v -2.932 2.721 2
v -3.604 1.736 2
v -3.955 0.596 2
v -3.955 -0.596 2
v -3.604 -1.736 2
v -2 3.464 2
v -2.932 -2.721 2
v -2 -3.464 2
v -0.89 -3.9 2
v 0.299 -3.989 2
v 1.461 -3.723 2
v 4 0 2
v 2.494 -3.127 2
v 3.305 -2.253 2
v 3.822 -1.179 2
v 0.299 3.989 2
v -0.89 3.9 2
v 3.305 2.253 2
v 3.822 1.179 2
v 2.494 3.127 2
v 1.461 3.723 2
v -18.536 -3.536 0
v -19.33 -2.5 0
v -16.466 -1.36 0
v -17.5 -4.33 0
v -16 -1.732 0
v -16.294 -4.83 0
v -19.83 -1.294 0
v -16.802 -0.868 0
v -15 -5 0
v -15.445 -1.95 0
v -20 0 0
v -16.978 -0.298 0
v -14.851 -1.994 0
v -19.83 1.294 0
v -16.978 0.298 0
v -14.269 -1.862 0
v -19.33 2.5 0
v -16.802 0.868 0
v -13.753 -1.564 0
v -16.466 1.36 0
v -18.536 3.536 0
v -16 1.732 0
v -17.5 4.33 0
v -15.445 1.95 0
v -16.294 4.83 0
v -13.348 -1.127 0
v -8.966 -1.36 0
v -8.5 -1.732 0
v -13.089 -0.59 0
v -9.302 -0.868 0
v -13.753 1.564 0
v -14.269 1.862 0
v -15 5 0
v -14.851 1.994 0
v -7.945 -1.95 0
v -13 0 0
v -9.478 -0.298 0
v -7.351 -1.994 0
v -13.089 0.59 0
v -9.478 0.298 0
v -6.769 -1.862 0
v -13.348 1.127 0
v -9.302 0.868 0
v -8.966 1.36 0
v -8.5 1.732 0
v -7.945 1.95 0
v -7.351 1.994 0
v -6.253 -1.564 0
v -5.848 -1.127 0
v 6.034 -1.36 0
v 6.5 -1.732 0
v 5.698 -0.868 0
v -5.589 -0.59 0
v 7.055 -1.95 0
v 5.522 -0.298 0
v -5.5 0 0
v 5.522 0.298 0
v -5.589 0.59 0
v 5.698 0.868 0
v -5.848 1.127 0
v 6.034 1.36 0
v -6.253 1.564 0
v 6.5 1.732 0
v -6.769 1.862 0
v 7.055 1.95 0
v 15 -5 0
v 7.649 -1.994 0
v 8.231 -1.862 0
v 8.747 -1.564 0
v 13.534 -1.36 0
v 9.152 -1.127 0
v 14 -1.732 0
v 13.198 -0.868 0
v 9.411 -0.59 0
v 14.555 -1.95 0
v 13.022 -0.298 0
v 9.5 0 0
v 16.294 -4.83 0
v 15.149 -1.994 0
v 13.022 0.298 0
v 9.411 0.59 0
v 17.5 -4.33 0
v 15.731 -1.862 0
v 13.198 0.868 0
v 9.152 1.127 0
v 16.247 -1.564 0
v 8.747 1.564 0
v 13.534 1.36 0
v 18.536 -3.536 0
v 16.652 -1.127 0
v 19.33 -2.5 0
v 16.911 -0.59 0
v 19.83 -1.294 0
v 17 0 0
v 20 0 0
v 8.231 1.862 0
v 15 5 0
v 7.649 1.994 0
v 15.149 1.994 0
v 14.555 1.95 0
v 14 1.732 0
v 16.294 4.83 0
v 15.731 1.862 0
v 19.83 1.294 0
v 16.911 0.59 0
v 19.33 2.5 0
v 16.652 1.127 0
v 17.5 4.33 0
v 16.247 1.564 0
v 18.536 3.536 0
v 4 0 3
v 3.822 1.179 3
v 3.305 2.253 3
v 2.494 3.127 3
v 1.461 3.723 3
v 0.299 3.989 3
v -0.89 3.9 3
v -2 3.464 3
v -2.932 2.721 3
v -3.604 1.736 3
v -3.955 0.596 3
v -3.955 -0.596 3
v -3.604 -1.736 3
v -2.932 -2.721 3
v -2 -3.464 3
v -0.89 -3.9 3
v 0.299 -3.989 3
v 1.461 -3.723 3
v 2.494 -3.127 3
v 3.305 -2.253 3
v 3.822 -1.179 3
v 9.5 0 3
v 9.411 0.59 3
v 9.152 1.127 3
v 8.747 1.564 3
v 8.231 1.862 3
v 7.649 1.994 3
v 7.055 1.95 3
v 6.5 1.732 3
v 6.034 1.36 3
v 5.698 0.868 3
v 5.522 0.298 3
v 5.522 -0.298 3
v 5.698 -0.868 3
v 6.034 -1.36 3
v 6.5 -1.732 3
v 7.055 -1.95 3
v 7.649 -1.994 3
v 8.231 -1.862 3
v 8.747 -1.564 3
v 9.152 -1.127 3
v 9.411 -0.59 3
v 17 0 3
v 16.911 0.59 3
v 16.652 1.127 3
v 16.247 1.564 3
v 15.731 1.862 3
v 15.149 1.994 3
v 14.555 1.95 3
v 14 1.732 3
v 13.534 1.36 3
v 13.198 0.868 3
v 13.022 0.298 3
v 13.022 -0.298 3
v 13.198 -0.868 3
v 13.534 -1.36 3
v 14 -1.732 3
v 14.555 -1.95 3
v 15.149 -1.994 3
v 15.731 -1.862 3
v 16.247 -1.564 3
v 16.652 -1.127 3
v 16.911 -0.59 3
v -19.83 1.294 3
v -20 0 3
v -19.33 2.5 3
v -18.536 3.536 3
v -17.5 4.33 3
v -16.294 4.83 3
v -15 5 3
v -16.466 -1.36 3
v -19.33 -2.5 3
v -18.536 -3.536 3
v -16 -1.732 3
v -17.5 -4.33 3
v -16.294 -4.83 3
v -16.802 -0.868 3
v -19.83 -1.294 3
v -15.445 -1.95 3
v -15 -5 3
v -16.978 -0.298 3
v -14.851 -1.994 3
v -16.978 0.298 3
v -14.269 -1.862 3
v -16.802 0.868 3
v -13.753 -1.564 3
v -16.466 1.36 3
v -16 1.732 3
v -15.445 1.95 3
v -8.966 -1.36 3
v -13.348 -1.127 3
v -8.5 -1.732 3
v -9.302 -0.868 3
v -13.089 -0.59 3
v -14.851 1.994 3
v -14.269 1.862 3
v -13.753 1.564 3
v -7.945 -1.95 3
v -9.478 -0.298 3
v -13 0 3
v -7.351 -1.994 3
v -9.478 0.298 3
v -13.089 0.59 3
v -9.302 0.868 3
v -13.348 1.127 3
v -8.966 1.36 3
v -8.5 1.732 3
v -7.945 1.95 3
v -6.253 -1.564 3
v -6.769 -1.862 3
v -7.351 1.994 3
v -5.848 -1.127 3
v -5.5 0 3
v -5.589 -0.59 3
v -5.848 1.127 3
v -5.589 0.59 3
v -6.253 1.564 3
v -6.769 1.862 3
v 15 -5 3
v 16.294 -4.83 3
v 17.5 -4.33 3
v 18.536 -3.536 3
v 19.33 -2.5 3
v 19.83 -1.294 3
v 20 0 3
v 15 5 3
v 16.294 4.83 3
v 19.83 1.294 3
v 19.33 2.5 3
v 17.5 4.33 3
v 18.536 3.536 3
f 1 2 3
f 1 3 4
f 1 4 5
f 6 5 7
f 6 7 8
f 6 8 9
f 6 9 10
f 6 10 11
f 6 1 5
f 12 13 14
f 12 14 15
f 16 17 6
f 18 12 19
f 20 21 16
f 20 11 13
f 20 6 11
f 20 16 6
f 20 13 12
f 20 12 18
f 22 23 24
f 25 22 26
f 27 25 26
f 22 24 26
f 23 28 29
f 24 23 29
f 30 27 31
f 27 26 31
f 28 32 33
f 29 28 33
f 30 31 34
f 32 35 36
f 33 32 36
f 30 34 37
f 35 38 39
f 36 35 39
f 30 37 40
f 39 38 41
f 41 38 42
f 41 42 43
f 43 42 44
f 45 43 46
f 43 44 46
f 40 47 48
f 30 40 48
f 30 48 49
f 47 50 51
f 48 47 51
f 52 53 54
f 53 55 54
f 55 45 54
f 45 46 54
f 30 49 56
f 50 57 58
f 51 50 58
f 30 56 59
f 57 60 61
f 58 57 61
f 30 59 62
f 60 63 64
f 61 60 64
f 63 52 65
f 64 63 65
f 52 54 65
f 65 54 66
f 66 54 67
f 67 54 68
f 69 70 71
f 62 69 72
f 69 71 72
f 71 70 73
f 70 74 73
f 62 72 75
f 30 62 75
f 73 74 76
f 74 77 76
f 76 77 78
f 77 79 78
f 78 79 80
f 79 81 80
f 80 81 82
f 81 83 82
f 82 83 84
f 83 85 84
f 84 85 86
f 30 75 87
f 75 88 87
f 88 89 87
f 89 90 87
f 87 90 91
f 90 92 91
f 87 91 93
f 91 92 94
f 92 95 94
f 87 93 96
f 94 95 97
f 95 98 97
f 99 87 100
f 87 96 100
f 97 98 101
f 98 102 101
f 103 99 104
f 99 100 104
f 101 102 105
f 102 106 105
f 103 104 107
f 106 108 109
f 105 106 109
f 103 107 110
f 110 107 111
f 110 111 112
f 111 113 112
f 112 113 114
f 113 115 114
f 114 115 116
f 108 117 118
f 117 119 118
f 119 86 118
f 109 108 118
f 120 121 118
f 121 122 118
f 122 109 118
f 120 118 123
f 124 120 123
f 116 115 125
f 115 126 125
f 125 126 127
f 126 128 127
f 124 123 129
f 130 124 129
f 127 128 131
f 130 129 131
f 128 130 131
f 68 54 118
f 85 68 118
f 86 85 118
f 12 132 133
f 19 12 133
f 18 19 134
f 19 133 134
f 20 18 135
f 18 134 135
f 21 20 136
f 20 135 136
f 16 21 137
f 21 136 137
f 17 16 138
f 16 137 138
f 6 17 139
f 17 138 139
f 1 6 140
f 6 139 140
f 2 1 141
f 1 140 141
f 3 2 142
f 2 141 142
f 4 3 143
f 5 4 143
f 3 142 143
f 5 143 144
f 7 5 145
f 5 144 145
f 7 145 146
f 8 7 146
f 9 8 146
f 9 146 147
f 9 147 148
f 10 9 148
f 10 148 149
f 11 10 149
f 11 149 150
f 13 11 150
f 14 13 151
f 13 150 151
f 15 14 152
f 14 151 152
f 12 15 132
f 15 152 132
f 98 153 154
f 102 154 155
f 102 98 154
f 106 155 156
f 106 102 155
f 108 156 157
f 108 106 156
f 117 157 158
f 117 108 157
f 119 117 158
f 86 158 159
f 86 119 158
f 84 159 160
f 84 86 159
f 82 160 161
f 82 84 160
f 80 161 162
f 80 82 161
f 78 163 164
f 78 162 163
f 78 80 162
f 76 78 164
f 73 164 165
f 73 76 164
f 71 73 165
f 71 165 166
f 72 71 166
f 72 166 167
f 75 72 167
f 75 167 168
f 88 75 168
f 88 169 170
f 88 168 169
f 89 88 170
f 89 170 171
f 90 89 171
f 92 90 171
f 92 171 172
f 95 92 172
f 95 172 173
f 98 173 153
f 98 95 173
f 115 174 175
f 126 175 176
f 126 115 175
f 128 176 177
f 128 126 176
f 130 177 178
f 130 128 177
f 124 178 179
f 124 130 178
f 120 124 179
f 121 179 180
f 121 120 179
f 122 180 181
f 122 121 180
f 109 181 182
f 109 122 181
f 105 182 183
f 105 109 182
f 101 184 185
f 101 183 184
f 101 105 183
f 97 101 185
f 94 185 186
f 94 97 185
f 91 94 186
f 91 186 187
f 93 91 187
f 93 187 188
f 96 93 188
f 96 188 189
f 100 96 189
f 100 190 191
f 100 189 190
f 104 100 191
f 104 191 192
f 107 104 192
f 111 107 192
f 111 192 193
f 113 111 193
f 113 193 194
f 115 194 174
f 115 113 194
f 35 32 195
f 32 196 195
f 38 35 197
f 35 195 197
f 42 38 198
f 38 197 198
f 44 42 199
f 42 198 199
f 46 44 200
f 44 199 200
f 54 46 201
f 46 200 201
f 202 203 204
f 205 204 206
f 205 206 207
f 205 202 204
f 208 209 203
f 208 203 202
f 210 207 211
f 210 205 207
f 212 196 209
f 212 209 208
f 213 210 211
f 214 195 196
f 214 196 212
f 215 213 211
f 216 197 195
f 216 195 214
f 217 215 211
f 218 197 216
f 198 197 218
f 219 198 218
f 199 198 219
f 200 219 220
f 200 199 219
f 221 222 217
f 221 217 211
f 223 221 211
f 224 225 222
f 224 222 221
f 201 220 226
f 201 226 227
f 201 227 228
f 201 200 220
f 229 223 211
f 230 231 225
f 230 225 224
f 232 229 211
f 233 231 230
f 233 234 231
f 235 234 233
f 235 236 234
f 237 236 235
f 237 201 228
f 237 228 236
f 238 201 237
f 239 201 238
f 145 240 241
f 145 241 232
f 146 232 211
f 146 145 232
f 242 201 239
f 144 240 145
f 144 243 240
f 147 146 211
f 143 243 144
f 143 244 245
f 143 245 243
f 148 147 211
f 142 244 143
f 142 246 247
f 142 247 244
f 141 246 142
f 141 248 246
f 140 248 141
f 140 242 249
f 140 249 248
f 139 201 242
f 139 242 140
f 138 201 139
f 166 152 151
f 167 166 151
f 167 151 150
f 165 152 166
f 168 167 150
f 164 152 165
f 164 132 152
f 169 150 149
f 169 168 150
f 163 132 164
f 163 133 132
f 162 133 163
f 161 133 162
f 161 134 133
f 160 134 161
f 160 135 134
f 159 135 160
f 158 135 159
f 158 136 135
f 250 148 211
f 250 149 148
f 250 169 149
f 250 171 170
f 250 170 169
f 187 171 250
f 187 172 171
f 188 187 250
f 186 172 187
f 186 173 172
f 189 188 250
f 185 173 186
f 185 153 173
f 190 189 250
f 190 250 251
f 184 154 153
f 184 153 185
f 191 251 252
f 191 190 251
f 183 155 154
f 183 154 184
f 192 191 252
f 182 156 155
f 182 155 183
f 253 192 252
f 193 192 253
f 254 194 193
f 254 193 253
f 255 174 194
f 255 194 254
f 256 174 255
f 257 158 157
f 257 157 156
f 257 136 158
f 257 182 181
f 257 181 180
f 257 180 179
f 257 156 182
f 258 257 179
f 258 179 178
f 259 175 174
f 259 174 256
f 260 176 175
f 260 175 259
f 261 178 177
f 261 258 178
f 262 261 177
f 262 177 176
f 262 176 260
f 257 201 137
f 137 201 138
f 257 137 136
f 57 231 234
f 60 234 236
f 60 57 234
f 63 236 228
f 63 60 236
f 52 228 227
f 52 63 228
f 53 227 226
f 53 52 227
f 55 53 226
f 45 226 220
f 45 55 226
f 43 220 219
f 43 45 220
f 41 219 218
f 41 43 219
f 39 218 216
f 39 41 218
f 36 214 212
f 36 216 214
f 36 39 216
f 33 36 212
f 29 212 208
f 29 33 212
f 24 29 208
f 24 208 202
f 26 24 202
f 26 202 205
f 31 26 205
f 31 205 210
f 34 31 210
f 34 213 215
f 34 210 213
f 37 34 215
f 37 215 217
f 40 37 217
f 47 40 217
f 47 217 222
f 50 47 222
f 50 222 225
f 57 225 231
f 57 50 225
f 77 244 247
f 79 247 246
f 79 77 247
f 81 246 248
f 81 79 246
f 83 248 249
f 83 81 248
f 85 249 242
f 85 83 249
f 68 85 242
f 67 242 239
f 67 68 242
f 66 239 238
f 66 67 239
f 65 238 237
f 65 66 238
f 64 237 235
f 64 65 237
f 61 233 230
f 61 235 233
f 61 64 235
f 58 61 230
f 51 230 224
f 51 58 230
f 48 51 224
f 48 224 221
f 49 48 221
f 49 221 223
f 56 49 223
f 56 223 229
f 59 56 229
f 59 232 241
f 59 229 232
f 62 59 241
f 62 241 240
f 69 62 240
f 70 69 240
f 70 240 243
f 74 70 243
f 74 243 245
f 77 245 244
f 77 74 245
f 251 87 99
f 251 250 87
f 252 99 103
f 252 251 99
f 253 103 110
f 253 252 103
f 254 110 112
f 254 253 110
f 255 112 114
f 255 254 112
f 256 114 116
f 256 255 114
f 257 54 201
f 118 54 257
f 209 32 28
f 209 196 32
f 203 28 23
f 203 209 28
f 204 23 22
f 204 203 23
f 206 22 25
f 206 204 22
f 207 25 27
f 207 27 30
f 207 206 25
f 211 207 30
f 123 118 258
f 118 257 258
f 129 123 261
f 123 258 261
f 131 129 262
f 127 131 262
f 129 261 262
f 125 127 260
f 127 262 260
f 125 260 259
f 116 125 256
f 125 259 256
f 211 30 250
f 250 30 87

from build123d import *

# Parameters (mm, degrees)
F0_W     = 40
F0_H     = 10
F1_DEPTH = 3
F2_R     = 4
F3_DEPTH = 1
F4_R     = 2
F5_DEPTH = 25
F6_R     = 4.99999


# Not quite as in the source:
# - a fillet or chamfer is up to 0.001 mm smaller than in the source, because OpenCascade refuses the exact size


with BuildPart() as f1:
    # F0 (on Top) → F1 (new body)
    with BuildSketch(Plane.XY):
        Rectangle(F0_W, F0_H)
    extrude(amount=F1_DEPTH)

    # F2 (on face) → F3 (cut)
    with BuildSketch(Plane.XY.offset(3)):
        Circle(F2_R)
    extrude(amount=-F3_DEPTH, mode=Mode.SUBTRACT)

    # F4 (on Top) → F5 (cut)
    with BuildSketch(Plane.XY):
        with Locations((-7.5, 0)):
            Circle(F4_R)
        with Locations((7.5, 0)):
            Circle(F4_R)
        with Locations((-15, 0)):
            Circle(F4_R)
        with Locations((15, 0)):
            Circle(F4_R)
    extrude(amount=F5_DEPTH, mode=Mode.SUBTRACT)

    # F6 (radius 5 in the source; OpenCascade refuses exactly that, so slightly less here)
    f6_edges = [f1.edges().sort_by_distance(p)[0] for p in [
        (-20, -5, 1.5),
        (-20, 5, 1.5),
        (20, -5, 1.5),
        (20, 5, 1.5),
    ]]
    fillet(f6_edges, radius=F6_R)


solid = f1.part
